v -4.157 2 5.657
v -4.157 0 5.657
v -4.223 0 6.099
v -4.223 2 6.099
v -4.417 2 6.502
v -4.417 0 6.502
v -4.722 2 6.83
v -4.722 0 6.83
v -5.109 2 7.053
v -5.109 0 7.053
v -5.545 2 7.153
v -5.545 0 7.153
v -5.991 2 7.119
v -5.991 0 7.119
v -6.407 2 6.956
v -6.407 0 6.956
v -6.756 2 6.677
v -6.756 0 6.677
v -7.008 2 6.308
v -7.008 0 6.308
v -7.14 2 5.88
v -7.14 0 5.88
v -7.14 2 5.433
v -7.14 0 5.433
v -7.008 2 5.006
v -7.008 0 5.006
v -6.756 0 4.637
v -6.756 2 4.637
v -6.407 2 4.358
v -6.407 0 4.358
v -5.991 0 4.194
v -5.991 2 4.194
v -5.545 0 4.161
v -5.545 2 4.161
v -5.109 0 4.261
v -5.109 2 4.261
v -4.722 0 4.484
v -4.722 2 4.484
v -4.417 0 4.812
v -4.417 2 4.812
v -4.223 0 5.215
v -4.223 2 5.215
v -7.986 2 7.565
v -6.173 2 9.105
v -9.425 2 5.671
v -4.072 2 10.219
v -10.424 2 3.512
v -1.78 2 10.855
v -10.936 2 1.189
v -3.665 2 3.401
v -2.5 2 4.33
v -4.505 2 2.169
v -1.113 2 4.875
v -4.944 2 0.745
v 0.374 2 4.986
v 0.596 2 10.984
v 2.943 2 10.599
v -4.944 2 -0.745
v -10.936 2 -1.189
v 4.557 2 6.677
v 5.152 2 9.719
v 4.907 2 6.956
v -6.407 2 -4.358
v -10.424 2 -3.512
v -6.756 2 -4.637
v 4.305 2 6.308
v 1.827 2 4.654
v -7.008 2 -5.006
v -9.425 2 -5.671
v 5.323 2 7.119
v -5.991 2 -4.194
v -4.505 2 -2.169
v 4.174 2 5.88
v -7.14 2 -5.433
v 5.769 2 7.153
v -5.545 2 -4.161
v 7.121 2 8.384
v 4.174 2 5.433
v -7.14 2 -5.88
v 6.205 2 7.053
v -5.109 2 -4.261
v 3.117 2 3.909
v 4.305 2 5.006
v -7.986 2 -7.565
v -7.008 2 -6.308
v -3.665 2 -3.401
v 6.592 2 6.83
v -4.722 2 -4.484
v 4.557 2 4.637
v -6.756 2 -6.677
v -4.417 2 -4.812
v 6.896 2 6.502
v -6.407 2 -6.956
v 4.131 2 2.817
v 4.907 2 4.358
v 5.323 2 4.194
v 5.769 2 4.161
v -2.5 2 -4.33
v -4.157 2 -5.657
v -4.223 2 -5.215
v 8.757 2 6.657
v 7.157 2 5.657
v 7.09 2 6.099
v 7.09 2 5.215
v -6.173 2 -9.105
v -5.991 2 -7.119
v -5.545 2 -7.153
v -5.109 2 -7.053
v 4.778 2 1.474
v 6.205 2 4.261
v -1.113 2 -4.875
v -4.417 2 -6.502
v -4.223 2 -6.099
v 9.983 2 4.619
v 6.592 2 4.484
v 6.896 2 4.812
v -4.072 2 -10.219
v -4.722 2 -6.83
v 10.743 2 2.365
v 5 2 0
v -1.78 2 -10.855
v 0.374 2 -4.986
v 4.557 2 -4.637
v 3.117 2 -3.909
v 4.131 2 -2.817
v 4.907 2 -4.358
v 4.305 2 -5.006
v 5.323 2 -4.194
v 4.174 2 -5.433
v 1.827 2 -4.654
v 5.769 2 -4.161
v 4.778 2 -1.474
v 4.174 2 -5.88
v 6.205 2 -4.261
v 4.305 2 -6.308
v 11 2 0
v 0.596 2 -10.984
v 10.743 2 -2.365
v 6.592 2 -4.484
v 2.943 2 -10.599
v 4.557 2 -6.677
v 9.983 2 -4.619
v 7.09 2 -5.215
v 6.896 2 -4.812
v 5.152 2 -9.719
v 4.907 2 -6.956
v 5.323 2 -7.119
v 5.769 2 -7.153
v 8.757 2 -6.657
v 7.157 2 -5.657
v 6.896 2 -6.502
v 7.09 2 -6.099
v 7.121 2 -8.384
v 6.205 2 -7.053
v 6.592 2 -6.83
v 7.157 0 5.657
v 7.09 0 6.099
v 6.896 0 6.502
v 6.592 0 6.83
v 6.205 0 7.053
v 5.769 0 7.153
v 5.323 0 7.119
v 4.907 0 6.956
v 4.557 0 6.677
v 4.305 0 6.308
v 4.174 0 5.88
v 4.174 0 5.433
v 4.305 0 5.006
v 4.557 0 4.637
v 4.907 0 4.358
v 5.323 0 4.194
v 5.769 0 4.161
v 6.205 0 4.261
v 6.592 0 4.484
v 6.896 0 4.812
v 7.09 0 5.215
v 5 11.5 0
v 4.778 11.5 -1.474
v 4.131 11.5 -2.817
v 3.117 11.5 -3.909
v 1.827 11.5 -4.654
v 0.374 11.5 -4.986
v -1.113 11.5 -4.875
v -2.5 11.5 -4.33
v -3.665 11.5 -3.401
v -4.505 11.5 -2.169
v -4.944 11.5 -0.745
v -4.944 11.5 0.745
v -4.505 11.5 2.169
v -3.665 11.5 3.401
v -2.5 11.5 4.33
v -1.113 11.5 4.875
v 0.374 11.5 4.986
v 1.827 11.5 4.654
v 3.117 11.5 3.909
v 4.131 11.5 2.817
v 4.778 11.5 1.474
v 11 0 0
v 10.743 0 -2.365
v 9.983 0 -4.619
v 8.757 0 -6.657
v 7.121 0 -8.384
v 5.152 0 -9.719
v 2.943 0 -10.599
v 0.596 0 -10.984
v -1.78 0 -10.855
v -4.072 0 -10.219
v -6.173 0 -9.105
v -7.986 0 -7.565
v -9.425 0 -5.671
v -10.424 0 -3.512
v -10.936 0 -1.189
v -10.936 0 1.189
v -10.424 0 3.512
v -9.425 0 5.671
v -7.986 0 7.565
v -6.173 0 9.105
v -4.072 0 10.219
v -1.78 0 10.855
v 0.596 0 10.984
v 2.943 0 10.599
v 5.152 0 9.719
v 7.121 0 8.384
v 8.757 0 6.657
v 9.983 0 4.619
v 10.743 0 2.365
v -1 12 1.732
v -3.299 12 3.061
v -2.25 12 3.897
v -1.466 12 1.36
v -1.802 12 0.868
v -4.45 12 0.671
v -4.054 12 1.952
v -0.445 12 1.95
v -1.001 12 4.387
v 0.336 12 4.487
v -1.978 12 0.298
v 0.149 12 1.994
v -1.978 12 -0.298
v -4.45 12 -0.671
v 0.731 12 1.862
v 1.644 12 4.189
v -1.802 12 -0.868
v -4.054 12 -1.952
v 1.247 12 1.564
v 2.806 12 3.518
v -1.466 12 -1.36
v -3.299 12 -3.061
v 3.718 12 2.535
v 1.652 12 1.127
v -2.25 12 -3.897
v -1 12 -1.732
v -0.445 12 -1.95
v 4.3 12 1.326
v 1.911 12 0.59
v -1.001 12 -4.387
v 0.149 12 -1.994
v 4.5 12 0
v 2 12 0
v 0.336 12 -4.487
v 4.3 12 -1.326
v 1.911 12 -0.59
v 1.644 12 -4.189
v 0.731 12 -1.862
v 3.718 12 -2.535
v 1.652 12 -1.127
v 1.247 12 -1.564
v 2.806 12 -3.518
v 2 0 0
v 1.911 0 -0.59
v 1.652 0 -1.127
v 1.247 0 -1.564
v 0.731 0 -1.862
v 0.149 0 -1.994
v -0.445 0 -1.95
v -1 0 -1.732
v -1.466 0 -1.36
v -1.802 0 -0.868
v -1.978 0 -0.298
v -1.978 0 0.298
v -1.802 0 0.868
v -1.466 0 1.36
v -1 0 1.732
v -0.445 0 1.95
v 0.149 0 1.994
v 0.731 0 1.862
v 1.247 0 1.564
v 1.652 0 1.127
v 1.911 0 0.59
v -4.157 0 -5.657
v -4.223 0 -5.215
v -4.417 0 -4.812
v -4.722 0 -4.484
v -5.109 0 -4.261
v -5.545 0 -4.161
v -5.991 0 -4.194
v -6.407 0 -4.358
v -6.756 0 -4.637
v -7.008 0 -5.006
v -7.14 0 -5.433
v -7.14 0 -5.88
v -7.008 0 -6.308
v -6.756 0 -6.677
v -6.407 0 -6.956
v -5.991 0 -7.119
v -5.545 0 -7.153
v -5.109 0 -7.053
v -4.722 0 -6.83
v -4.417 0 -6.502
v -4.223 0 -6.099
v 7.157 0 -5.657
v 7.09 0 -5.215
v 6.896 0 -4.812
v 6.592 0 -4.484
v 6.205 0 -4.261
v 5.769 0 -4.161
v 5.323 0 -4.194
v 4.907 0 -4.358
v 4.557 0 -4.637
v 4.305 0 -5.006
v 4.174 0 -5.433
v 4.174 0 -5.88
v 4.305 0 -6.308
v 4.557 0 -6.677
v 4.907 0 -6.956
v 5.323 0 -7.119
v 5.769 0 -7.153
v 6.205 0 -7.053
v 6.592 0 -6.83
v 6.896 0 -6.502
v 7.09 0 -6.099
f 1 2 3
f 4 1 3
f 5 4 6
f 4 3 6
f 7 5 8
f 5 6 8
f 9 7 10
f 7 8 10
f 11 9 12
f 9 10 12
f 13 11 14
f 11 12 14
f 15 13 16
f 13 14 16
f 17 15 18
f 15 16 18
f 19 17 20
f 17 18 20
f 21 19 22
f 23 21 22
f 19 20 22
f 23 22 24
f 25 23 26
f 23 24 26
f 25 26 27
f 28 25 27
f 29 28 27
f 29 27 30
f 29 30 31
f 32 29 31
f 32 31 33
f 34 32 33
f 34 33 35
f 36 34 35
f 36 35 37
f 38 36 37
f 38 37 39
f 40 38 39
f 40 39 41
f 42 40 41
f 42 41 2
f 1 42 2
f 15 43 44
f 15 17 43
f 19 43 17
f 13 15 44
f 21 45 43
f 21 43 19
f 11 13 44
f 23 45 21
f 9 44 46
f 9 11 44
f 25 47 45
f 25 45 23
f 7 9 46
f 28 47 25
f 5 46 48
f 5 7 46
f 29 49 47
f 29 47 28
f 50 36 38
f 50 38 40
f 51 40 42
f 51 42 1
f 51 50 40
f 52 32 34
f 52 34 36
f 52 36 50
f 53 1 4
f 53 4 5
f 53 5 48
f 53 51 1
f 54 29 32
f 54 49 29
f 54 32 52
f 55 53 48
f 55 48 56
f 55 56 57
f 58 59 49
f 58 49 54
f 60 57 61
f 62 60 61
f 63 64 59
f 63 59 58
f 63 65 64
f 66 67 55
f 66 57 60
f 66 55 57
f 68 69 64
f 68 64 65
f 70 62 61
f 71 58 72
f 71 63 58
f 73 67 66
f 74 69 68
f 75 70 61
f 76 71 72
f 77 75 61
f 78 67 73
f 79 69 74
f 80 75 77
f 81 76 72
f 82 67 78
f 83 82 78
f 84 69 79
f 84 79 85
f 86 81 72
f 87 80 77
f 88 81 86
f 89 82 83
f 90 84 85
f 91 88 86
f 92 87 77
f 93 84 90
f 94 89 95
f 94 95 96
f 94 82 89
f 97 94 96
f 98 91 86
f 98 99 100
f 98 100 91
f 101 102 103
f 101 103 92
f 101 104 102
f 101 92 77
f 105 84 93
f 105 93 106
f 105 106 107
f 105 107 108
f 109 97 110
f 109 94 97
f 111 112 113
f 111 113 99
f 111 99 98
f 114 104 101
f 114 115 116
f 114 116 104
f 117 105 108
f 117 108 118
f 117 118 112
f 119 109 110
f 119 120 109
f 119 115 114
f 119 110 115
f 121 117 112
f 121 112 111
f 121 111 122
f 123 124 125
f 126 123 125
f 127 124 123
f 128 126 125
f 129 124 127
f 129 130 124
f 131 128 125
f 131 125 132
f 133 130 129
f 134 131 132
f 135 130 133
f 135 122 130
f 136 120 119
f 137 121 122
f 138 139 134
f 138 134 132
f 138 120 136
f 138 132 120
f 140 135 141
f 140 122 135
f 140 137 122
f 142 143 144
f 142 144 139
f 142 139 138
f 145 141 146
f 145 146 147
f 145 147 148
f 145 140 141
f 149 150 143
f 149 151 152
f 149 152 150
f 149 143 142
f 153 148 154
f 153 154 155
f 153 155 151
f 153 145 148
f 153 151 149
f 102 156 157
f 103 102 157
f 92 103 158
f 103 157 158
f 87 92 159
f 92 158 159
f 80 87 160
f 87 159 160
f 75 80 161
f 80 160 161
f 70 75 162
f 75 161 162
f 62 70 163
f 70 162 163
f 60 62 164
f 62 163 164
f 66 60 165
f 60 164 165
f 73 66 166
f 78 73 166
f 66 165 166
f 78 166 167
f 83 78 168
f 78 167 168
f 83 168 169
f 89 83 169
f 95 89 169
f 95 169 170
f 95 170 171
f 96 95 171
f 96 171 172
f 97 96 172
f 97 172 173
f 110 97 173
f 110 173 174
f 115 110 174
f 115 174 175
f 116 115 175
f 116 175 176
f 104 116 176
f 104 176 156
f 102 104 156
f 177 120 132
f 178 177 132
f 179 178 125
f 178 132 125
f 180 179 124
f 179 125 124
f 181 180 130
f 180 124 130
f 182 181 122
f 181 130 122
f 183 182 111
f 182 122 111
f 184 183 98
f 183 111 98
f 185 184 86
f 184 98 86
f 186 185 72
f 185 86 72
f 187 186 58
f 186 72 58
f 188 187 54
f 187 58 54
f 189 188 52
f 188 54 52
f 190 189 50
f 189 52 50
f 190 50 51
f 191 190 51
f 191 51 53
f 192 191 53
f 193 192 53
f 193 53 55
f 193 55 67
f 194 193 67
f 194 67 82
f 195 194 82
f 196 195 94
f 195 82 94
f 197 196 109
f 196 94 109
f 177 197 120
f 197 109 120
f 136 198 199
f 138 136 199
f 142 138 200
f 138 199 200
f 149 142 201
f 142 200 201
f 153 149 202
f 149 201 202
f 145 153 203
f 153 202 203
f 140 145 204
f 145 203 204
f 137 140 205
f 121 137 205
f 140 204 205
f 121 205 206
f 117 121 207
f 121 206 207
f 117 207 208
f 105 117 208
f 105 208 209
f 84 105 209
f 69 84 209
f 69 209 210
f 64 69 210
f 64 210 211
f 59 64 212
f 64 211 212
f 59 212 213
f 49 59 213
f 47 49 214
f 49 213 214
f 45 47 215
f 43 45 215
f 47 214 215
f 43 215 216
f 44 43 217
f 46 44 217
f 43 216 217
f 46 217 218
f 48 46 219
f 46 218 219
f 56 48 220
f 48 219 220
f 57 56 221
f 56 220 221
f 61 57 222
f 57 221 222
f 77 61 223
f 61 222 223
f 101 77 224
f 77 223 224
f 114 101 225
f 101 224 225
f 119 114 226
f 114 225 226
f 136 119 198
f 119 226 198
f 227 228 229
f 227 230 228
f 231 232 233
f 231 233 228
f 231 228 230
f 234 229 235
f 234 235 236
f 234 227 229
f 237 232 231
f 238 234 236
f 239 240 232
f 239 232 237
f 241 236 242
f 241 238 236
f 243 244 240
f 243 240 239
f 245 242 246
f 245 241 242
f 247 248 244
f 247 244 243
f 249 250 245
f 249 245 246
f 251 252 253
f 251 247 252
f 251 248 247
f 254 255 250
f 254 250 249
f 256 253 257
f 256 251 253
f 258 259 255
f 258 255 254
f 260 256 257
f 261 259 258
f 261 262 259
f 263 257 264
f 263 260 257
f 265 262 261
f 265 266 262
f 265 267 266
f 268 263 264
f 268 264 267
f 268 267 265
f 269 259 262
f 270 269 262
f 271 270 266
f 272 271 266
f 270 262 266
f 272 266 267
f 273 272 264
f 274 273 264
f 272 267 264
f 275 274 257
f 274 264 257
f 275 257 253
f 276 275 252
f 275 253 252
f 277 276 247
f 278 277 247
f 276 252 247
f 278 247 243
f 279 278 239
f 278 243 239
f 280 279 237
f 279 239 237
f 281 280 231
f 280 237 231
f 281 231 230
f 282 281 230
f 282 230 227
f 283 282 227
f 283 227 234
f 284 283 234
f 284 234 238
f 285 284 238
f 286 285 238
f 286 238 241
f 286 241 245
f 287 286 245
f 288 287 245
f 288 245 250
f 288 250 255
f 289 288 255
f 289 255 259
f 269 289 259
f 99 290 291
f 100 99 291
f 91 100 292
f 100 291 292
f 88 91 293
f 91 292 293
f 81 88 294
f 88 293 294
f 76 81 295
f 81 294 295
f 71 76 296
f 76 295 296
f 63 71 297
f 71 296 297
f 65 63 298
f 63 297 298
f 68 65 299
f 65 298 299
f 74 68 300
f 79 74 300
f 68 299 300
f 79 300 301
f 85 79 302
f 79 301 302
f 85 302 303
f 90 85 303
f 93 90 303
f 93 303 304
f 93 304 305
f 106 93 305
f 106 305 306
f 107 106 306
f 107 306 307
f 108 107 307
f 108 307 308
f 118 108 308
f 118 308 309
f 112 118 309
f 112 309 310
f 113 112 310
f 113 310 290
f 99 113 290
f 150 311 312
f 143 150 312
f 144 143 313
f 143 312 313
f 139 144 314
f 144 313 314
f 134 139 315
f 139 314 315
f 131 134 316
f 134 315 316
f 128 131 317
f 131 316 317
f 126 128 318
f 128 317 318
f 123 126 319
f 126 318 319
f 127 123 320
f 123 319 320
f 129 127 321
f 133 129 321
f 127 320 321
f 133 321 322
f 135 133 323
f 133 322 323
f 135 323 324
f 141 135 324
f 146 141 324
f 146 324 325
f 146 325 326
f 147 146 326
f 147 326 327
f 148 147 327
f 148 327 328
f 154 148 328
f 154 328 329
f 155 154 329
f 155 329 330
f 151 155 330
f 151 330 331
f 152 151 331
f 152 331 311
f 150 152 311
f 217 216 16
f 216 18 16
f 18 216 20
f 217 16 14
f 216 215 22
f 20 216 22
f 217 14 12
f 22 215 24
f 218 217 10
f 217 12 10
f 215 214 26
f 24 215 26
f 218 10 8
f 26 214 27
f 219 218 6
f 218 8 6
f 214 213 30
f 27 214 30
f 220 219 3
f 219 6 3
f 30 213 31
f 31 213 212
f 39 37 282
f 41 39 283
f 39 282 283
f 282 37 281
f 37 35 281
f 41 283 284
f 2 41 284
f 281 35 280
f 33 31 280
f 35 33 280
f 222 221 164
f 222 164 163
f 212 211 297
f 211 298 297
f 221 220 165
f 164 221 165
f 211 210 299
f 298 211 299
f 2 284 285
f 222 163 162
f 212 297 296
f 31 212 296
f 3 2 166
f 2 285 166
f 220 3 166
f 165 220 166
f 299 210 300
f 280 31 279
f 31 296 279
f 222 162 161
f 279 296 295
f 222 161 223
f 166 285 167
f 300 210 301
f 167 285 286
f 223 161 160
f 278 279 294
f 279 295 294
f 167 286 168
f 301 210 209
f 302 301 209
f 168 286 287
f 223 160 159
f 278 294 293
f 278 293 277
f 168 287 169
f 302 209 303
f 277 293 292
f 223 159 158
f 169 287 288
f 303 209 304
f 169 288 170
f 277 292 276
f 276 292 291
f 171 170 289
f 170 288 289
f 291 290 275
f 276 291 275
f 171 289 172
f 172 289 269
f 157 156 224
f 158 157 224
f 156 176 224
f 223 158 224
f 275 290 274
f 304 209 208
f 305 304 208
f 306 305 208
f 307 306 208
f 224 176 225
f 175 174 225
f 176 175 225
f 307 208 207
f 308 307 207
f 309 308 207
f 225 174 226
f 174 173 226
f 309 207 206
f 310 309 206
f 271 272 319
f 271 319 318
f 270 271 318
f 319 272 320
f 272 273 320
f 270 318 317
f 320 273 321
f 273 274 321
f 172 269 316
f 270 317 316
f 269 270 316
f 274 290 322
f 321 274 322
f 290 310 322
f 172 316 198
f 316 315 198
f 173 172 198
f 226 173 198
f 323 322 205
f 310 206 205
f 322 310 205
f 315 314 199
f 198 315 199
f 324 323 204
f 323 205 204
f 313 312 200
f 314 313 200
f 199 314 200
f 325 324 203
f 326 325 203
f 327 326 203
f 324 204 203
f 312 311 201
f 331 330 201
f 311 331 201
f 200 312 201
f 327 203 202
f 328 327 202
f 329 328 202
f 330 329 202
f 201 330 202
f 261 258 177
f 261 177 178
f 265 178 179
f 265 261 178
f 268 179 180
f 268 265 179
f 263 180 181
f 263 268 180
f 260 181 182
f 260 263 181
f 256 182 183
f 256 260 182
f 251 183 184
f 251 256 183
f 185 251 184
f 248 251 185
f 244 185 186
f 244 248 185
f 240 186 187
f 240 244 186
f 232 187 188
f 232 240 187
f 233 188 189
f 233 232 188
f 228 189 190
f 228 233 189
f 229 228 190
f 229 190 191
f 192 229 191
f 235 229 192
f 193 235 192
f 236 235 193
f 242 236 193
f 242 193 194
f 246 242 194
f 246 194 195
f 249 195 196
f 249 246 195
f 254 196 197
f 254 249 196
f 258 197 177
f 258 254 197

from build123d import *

# Parameters (mm, degrees)
SKETCH1_R           = 11
BOSS_EXTRUDE1_DEPTH = 2
SKETCH2_R           = 5
BOSS_EXTRUDE2_DEPTH = 10
SKETCH3_R           = 2
CUT_EXTRUDE1_DEPTH  = 13
CHAMFER1_SIZE       = 0.5
SKETCH4_R           = 1.5
CUT_EXTRUDE2_DEPTH  = 10


with BuildPart() as part:
    # Sketch1 → Boss-Extrude1 (new body)
    with BuildSketch(Plane(origin=(0, 0, 0), x_dir=(1, 0, 0), z_dir=(0, 1, 0))):
        Circle(SKETCH1_R)
    extrude(amount=BOSS_EXTRUDE1_DEPTH)

    # Sketch2 → Boss-Extrude2 (add)
    with BuildSketch(Plane(origin=(0, 2, 0), x_dir=(1, 0, 0), z_dir=(0, 1, 0))):
        Circle(SKETCH2_R)
    extrude(amount=BOSS_EXTRUDE2_DEPTH)

    # Sketch3 → Cut-Extrude1 (cut, through all)
    with BuildSketch(Plane(origin=(0, 12, 0), x_dir=(1, 0, 0), z_dir=(0, 1, 0))):
        Circle(SKETCH3_R)
    extrude(amount=-CUT_EXTRUDE1_DEPTH, mode=Mode.SUBTRACT)

    # Chamfer1
    chamfer1_edges = [part.edges().sort_by_distance(p)[0] for p in [
        (-5, 12, 0),
    ]]
    chamfer(chamfer1_edges, length=CHAMFER1_SIZE)

    # Sketch4 → Cut-Extrude2 (cut)
    with BuildSketch(Plane.XZ):
        with Locations((-5.656854249, 5.656854249)):
            Circle(SKETCH4_R)
        with Locations((5.656854249, 5.656854249)):
            Circle(SKETCH4_R)
        with Locations((5.656854249, -5.656854249)):
            Circle(SKETCH4_R)
        with Locations((-5.656854249, -5.656854249)):
            Circle(SKETCH4_R)
    extrude(amount=-CUT_EXTRUDE2_DEPTH, mode=Mode.SUBTRACT)


solid = part.part
